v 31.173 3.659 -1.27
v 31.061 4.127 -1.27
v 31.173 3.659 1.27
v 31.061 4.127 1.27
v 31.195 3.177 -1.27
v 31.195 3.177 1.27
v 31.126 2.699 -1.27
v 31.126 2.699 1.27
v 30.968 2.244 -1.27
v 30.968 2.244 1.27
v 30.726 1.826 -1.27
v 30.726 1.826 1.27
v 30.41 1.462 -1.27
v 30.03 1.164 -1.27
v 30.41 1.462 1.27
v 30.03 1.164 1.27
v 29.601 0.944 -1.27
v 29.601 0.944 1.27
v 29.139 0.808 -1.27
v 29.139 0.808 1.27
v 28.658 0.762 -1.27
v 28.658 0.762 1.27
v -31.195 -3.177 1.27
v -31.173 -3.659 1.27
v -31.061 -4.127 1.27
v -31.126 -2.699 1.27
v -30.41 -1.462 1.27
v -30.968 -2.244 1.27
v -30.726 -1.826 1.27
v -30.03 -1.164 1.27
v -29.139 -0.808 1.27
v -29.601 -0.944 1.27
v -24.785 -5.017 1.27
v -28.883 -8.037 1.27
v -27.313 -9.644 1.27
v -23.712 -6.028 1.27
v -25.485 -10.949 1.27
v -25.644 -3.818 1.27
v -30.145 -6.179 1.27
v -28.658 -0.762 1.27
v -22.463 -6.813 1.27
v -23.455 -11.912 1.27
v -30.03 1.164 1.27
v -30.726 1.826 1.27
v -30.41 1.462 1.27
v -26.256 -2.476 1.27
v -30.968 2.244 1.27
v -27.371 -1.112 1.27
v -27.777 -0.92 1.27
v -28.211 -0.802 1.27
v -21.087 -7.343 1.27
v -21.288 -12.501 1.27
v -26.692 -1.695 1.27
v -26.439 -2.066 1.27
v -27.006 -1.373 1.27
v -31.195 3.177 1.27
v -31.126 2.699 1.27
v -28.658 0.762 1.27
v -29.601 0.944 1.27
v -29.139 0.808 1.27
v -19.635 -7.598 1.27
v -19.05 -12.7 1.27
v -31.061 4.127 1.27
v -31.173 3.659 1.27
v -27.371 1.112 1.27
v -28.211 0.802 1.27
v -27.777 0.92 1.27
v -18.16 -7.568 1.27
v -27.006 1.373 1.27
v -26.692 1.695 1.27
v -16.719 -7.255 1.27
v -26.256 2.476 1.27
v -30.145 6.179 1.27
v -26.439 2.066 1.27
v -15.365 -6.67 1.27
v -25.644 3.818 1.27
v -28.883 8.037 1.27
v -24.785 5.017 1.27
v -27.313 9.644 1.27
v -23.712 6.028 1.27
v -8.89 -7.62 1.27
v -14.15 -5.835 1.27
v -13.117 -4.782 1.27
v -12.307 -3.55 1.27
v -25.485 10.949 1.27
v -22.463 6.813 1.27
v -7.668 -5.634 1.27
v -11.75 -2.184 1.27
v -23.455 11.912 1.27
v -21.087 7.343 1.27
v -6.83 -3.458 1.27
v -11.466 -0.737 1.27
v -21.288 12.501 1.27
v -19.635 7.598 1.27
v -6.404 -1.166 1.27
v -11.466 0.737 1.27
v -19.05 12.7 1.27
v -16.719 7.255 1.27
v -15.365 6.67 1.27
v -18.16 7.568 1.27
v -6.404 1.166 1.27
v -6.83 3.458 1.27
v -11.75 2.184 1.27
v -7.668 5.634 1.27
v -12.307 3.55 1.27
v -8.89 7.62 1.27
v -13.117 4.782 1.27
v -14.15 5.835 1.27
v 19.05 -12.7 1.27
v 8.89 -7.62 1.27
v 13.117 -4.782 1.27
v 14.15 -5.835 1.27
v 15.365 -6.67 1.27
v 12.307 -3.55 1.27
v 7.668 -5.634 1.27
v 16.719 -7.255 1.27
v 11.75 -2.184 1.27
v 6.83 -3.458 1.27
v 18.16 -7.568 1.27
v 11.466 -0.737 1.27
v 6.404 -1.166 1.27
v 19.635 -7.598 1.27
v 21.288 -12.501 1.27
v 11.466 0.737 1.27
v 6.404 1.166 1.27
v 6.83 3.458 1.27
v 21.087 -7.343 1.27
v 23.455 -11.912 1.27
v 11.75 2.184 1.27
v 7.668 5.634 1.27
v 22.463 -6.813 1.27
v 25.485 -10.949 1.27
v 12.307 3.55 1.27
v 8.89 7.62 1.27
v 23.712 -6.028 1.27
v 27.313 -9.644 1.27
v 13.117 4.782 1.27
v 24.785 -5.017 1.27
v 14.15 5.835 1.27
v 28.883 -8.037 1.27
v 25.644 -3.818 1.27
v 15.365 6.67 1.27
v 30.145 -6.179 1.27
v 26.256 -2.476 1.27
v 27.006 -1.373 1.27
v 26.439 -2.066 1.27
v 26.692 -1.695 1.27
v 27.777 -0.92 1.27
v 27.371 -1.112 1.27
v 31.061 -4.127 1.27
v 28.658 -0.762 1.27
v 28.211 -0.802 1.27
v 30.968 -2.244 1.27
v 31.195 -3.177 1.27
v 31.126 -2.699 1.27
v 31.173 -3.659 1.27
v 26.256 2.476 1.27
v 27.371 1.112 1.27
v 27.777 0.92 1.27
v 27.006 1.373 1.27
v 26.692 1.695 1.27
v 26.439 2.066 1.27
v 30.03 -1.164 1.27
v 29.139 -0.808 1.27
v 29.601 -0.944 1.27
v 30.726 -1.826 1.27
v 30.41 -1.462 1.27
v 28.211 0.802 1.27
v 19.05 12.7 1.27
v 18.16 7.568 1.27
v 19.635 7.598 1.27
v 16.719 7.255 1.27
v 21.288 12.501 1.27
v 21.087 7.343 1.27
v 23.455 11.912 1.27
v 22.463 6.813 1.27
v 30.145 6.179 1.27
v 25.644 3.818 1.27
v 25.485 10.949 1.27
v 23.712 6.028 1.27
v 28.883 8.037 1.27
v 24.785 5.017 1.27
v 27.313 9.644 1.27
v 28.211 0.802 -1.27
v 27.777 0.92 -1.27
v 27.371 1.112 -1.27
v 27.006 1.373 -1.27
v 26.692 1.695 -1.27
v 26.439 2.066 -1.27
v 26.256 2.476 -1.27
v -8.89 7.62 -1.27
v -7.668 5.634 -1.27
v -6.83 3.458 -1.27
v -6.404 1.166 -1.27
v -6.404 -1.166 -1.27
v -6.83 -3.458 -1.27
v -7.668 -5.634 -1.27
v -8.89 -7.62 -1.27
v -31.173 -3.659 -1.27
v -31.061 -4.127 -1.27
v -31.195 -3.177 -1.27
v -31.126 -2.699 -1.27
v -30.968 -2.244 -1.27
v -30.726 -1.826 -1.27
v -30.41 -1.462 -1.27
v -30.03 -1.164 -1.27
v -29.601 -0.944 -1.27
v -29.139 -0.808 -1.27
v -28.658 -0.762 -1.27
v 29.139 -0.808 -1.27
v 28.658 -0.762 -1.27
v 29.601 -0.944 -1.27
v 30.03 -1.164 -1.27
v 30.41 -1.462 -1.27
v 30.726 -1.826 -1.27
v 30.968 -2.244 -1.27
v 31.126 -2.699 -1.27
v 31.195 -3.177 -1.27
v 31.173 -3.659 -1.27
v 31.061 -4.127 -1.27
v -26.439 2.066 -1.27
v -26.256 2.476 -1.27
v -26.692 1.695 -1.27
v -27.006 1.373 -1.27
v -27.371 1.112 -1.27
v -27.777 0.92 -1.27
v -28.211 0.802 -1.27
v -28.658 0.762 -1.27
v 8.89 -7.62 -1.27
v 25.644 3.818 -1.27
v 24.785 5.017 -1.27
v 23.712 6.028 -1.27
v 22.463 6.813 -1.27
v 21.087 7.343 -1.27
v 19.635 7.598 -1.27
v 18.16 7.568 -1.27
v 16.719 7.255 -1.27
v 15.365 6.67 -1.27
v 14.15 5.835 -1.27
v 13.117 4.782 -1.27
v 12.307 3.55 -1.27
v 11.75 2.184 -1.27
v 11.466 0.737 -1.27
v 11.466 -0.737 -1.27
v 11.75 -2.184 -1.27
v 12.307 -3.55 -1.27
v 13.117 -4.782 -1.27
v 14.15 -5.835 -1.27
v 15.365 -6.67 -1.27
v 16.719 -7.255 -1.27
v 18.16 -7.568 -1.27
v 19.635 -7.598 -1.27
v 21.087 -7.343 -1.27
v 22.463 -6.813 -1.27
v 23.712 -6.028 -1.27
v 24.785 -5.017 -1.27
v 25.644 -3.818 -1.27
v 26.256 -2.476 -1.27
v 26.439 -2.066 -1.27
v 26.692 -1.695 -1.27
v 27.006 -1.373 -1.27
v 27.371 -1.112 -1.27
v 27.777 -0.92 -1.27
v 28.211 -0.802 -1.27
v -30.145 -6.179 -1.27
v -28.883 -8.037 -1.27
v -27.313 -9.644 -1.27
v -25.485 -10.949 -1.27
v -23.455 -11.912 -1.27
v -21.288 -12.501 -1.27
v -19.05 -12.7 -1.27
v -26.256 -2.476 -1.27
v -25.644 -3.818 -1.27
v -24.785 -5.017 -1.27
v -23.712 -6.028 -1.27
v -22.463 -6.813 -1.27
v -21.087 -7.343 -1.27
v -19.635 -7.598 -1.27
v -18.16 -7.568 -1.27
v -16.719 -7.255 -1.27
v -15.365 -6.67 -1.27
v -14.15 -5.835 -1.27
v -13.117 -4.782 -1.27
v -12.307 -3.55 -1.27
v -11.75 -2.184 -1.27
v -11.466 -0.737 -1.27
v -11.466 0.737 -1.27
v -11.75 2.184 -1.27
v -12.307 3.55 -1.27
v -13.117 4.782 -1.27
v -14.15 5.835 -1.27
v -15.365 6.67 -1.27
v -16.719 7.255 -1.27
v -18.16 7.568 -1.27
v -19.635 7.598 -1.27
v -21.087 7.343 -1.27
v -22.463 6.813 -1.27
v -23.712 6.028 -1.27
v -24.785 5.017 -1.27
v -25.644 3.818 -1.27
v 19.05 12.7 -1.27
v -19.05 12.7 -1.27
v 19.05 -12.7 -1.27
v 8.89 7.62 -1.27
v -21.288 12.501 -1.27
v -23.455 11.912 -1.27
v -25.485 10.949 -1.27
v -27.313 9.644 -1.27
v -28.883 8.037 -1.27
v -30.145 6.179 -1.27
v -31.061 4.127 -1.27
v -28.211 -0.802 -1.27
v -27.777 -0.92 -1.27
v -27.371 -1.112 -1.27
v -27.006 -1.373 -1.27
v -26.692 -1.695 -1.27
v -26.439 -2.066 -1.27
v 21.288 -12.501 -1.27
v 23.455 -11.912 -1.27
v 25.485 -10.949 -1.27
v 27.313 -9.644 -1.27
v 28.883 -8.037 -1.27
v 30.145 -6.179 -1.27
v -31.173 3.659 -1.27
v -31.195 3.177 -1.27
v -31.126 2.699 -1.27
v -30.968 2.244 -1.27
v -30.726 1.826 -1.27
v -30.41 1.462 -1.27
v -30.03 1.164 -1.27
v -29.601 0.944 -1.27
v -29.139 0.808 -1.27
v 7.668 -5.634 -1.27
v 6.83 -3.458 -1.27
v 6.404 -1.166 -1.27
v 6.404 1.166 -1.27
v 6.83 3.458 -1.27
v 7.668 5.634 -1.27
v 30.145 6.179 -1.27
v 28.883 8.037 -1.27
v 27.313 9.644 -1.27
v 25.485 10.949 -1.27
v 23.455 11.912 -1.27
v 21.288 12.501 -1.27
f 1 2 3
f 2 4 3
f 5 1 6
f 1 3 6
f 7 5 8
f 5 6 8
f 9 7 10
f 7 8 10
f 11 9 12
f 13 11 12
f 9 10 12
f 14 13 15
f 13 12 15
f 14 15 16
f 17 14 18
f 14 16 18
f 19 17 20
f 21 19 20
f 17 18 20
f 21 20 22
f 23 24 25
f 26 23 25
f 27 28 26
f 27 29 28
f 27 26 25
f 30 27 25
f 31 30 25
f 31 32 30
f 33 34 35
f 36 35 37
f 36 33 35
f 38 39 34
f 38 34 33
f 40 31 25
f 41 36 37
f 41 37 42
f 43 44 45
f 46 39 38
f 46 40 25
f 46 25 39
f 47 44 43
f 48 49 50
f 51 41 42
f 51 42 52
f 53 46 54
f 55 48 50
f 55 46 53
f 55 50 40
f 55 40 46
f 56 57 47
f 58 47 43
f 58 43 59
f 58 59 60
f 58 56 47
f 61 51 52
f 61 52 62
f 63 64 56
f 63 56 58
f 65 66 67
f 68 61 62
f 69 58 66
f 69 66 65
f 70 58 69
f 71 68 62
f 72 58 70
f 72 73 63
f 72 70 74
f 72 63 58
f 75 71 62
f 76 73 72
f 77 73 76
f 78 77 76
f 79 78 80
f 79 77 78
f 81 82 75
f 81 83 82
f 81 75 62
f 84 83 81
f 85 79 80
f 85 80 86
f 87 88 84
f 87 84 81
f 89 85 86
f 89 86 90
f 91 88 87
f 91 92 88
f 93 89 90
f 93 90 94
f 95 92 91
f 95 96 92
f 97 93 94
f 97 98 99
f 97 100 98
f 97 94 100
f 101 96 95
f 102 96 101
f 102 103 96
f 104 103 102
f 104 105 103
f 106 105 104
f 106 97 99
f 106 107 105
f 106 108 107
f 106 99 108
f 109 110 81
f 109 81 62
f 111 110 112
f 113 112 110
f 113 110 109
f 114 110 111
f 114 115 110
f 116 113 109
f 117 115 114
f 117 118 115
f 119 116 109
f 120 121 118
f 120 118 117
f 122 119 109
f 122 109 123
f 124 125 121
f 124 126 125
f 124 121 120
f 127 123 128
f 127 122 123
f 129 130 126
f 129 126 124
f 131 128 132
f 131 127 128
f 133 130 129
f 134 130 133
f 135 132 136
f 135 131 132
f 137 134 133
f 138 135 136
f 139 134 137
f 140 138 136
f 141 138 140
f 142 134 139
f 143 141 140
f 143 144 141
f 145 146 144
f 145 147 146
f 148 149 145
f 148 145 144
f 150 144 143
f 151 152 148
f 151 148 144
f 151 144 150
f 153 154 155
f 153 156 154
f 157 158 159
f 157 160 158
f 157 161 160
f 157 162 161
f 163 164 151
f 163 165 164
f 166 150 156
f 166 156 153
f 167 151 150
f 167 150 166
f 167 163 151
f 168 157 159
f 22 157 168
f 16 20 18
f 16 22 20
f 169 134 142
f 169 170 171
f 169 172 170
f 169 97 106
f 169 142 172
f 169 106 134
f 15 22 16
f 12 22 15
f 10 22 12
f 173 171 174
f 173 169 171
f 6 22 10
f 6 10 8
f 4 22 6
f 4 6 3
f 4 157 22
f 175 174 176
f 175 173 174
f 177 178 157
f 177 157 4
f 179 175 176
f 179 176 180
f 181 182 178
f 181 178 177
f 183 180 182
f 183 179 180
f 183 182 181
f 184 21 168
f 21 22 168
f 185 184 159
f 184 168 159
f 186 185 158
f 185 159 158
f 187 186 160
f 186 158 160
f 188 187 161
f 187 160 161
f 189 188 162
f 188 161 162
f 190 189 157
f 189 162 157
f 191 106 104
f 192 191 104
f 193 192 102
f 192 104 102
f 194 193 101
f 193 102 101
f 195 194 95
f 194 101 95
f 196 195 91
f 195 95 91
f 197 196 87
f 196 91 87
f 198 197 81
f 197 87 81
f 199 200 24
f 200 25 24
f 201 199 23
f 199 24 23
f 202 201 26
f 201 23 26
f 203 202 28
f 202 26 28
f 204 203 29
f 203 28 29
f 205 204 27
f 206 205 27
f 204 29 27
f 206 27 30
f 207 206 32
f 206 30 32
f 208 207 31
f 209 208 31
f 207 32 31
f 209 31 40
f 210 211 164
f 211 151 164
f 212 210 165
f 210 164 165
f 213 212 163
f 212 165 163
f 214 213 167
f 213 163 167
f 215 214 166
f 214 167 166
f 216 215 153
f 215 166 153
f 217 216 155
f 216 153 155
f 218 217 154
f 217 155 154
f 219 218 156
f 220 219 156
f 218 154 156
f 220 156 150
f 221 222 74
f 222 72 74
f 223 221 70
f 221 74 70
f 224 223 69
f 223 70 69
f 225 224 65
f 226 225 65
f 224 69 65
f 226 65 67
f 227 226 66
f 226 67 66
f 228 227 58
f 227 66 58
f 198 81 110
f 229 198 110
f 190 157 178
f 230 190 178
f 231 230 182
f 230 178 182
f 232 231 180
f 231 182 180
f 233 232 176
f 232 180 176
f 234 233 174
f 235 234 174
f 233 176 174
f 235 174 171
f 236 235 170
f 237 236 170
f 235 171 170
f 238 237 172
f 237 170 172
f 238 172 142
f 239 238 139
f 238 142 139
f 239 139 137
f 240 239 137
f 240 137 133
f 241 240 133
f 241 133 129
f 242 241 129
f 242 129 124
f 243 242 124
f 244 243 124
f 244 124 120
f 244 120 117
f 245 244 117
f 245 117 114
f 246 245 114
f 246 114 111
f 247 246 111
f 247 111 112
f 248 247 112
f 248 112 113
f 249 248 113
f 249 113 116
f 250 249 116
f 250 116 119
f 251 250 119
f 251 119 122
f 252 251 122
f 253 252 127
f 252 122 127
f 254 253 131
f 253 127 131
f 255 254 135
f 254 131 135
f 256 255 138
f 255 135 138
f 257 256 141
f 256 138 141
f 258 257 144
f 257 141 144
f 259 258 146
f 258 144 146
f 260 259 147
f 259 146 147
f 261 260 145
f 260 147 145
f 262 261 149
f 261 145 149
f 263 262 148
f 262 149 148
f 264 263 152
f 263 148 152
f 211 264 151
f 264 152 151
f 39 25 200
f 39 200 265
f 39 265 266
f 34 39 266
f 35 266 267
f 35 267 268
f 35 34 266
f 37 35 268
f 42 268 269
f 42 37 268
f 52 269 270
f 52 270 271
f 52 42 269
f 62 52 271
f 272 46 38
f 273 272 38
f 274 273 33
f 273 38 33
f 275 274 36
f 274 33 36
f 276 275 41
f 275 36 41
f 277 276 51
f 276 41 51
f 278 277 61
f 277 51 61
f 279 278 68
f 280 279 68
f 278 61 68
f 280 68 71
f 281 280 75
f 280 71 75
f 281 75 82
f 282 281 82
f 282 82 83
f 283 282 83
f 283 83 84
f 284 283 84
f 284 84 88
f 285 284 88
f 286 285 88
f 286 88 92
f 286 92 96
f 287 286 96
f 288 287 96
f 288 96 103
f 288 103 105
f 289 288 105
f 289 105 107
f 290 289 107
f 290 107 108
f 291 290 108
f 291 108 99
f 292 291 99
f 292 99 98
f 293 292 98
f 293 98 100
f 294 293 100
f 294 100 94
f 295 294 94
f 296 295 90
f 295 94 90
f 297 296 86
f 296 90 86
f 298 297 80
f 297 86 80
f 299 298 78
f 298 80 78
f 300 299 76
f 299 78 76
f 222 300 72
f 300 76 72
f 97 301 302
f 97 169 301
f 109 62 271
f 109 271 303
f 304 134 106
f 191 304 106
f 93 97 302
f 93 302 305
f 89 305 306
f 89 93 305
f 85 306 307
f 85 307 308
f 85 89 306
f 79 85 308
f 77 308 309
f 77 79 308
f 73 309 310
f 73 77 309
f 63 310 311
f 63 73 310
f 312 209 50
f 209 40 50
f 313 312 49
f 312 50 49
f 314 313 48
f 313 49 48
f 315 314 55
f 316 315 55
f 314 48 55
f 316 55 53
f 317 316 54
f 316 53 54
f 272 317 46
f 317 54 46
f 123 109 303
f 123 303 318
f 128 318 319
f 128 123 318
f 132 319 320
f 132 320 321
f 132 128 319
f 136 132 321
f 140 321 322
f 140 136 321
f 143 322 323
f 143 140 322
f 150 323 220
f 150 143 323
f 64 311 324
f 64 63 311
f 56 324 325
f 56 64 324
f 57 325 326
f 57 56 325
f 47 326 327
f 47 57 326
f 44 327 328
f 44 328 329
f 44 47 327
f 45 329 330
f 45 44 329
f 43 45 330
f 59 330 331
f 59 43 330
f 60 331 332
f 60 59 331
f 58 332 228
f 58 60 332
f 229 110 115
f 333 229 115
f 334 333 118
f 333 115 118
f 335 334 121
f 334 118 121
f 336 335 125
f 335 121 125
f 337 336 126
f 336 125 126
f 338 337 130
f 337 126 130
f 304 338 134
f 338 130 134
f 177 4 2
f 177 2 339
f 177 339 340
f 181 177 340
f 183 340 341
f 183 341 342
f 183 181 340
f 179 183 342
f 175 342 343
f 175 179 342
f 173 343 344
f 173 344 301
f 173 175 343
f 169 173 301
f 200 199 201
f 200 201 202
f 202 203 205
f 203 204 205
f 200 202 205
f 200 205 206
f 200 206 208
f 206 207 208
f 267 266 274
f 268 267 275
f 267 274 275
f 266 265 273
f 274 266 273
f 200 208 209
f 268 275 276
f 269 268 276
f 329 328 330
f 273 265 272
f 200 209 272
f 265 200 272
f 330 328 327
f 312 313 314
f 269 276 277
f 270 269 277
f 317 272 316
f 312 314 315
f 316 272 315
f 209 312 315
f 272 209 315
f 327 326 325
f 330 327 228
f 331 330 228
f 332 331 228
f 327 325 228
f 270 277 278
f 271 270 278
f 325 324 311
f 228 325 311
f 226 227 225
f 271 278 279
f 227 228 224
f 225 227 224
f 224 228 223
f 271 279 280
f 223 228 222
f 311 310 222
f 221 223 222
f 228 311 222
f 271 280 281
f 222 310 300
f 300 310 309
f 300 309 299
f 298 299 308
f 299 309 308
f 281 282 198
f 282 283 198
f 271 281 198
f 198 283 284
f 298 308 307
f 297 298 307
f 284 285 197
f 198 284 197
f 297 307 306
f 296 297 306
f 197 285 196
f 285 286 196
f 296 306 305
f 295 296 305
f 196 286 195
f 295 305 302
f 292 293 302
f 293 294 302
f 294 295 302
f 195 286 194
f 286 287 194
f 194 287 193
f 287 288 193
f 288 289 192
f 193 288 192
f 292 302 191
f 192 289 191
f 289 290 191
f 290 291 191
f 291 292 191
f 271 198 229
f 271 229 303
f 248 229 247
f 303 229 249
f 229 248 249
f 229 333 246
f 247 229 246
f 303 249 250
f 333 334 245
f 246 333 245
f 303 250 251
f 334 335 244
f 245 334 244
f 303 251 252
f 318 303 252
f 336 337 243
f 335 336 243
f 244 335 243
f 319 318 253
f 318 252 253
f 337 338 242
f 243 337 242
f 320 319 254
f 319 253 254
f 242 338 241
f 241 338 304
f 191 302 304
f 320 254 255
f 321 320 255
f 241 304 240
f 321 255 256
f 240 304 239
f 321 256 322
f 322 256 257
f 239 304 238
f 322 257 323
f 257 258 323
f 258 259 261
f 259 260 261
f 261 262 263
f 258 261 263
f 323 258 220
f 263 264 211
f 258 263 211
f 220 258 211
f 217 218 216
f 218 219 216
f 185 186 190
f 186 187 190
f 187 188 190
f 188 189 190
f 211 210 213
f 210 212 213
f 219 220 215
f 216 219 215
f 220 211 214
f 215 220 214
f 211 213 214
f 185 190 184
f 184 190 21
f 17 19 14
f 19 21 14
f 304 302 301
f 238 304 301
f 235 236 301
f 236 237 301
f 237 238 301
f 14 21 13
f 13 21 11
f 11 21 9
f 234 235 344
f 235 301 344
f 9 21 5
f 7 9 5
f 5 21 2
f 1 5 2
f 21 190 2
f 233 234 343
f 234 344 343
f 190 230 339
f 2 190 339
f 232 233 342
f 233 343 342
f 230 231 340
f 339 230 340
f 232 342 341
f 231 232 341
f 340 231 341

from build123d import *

# Parameters (mm, degrees)
F1_DEPTH = 1.27
F2_R     = 7.62
F3_DEPTH = 25.4
F5_W     = 12.5357808316
F5_H     = 1.524
F6_DEPTH = 25.4
F7_R     = 2.53999


# Not quite as in the source:
# - a fillet or chamfer is up to 0.001 mm smaller than in the source, because OpenCascade refuses the exact size


with BuildPart() as f1:
    # F0 (on Top) → F1 (new body, symmetric)
    with BuildSketch(Plane.XY):
        with BuildLine():
            Line((19.05, 12.7), (-19.05, 12.7))
            ThreePointArc((-19.05, 12.7), (-31.75, 0), (-19.05, -12.7))
            Line((-19.05, -12.7), (19.05, -12.7))
            ThreePointArc((19.05, -12.7), (31.75, 0), (19.05, 12.7))
        make_face()
    extrude(amount=F1_DEPTH, both=True)

    # F2 (on face) → F3 (cut)
    with BuildSketch(Plane.XY.offset(1.27)):
        with Locations((-19.05, 0)):
            Circle(F2_R)
        with Locations((19.05, 0)):
            Circle(F2_R)
        with BuildLine():
            Line((8.89, 7.62), (-8.89, 7.62))
            ThreePointArc((-8.89, 7.62), (-6.35, 0), (-8.89, -7.62))
            Line((-8.89, -7.62), (8.89, -7.62))
            ThreePointArc((8.89, -7.62), (6.35, 0), (8.89, 7.62))
        make_face()
    extrude(amount=-F3_DEPTH, mode=Mode.SUBTRACT)

    # F5 (on face) → F6 (cut)
    with BuildSketch(Plane.XY.offset(1.27)):
        with Locations((-25.4821095842, 0)):
            Rectangle(F5_W, F5_H)
        with Locations((25.4821095842, 0)):
            Rectangle(F5_W, F5_H)
    extrude(amount=-F6_DEPTH, mode=Mode.SUBTRACT)

    # F7 (radius 2.54 in the source; OpenCascade refuses exactly that, so slightly less here)
    f7_edges = [f1.edges().sort_by_distance(p)[0] for p in [
        (26.631804, 0.762, 0),
        (26.631804, -0.762, 0),
        (-26.631804, 0.762, 0),
        (-26.631804, -0.762, 0),
        (-31.727119, -0.762, 0),
        (-31.727119, 0.762, 0),
        (31.727119, 0.762, 0),
        (31.727119, -0.762, 0),
    ]]
    fillet(f7_edges, radius=F7_R)


solid = f1.part
